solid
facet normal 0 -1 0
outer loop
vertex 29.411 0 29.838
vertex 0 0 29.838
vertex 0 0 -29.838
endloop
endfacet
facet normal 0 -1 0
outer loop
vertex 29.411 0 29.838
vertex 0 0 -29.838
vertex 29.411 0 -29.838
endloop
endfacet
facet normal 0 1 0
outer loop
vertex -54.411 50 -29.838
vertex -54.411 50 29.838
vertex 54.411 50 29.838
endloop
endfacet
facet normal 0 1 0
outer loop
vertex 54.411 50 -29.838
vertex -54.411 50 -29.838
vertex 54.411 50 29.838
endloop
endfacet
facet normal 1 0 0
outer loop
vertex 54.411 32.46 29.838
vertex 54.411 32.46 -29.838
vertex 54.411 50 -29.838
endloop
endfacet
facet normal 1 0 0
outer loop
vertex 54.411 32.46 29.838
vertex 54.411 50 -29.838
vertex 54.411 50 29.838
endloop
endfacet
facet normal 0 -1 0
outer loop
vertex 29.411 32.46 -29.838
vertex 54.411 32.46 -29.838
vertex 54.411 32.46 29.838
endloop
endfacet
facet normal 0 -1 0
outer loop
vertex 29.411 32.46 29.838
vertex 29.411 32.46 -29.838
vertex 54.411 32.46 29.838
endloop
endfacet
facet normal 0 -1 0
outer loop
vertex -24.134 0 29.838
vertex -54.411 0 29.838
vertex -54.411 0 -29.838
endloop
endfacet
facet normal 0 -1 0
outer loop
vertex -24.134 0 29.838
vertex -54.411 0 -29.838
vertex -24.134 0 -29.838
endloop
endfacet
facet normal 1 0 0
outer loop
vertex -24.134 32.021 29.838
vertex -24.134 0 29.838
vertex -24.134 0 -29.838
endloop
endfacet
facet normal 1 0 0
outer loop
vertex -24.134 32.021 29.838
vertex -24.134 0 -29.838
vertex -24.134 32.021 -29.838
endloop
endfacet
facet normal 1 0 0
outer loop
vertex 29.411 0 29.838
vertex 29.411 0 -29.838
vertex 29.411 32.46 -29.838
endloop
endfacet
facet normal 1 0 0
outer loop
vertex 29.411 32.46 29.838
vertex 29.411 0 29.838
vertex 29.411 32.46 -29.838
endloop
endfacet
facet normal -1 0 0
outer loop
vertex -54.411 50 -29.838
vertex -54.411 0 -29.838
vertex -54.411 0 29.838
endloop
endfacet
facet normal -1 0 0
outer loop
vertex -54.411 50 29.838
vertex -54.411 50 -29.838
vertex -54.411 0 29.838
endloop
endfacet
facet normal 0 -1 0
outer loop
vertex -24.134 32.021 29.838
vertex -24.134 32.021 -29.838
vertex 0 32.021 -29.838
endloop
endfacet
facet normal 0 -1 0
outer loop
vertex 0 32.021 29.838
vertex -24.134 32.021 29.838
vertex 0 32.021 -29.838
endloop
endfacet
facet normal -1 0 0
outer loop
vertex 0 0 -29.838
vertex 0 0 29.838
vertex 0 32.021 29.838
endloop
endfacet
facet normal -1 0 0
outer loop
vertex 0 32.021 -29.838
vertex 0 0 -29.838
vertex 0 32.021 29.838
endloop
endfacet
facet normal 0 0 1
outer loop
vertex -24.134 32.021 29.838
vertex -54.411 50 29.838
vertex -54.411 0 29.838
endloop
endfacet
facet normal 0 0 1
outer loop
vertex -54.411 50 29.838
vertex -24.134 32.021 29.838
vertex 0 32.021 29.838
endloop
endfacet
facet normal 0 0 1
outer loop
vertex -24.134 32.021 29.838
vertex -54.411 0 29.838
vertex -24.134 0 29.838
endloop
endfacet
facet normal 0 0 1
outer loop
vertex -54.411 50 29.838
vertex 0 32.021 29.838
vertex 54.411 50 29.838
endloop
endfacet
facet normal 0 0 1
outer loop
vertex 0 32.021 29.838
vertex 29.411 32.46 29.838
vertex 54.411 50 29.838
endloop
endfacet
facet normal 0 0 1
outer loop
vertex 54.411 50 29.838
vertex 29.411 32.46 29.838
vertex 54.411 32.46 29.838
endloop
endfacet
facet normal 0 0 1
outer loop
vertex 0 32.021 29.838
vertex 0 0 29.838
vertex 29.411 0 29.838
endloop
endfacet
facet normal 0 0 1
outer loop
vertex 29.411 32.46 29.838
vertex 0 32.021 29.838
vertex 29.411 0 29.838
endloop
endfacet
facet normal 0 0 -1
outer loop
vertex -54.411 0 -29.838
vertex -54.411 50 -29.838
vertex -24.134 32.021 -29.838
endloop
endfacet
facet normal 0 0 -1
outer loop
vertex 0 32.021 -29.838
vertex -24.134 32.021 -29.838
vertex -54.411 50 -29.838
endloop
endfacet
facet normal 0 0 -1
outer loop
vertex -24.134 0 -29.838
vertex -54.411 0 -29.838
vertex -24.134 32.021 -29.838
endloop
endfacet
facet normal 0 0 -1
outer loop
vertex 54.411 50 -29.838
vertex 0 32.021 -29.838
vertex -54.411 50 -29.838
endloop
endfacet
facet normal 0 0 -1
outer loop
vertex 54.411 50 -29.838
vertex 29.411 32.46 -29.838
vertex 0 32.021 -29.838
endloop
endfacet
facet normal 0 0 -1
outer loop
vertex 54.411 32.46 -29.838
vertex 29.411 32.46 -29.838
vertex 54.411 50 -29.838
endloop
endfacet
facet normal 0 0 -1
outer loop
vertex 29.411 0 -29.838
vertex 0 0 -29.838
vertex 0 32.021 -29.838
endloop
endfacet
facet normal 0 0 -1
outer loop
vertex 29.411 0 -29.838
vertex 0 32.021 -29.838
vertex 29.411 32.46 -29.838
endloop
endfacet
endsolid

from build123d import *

# Parameters (mm, degrees)
F0_W     = 108.822718
F0_H     = 59.676976
F1_DEPTH = 50
F2_W     = 32.45962
F2_H     = 59.676976
F3_DEPTH = 25
F4_W     = 24.134072
F4_H     = 32.020826
F5_DEPTH = 25
F6_DEPTH = 60


with BuildPart() as f1:
    # F0 (on Front) → F1 (new body)
    with BuildSketch(Plane.XZ):
        Rectangle(F0_W, F0_H)
    extrude(amount=-F1_DEPTH)

    # F2 (on face) → F3 (cut)
    with BuildSketch(Plane.YZ.offset(54.411359)):
        with Locations((16.22981, 0)):
            Rectangle(F2_W, F2_H)
    extrude(amount=-F3_DEPTH, mode=Mode.SUBTRACT)

    # F4 (on face) → F5 (cut)
    with BuildSketch(Plane.XY.offset(29.838488)):
        with Locations((-12.067036, 16.010413)):
            Rectangle(F4_W, F4_H)
    extrude(amount=F5_DEPTH, mode=Mode.SUBTRACT)

    # F4 (on face) → F6 (cut)
    with BuildSketch(Plane.XY.offset(29.838488)):
        with Locations((-12.067036, 16.010413)):
            Rectangle(F4_W, F4_H)
    extrude(amount=-F6_DEPTH, mode=Mode.SUBTRACT)


solid = f1.part
